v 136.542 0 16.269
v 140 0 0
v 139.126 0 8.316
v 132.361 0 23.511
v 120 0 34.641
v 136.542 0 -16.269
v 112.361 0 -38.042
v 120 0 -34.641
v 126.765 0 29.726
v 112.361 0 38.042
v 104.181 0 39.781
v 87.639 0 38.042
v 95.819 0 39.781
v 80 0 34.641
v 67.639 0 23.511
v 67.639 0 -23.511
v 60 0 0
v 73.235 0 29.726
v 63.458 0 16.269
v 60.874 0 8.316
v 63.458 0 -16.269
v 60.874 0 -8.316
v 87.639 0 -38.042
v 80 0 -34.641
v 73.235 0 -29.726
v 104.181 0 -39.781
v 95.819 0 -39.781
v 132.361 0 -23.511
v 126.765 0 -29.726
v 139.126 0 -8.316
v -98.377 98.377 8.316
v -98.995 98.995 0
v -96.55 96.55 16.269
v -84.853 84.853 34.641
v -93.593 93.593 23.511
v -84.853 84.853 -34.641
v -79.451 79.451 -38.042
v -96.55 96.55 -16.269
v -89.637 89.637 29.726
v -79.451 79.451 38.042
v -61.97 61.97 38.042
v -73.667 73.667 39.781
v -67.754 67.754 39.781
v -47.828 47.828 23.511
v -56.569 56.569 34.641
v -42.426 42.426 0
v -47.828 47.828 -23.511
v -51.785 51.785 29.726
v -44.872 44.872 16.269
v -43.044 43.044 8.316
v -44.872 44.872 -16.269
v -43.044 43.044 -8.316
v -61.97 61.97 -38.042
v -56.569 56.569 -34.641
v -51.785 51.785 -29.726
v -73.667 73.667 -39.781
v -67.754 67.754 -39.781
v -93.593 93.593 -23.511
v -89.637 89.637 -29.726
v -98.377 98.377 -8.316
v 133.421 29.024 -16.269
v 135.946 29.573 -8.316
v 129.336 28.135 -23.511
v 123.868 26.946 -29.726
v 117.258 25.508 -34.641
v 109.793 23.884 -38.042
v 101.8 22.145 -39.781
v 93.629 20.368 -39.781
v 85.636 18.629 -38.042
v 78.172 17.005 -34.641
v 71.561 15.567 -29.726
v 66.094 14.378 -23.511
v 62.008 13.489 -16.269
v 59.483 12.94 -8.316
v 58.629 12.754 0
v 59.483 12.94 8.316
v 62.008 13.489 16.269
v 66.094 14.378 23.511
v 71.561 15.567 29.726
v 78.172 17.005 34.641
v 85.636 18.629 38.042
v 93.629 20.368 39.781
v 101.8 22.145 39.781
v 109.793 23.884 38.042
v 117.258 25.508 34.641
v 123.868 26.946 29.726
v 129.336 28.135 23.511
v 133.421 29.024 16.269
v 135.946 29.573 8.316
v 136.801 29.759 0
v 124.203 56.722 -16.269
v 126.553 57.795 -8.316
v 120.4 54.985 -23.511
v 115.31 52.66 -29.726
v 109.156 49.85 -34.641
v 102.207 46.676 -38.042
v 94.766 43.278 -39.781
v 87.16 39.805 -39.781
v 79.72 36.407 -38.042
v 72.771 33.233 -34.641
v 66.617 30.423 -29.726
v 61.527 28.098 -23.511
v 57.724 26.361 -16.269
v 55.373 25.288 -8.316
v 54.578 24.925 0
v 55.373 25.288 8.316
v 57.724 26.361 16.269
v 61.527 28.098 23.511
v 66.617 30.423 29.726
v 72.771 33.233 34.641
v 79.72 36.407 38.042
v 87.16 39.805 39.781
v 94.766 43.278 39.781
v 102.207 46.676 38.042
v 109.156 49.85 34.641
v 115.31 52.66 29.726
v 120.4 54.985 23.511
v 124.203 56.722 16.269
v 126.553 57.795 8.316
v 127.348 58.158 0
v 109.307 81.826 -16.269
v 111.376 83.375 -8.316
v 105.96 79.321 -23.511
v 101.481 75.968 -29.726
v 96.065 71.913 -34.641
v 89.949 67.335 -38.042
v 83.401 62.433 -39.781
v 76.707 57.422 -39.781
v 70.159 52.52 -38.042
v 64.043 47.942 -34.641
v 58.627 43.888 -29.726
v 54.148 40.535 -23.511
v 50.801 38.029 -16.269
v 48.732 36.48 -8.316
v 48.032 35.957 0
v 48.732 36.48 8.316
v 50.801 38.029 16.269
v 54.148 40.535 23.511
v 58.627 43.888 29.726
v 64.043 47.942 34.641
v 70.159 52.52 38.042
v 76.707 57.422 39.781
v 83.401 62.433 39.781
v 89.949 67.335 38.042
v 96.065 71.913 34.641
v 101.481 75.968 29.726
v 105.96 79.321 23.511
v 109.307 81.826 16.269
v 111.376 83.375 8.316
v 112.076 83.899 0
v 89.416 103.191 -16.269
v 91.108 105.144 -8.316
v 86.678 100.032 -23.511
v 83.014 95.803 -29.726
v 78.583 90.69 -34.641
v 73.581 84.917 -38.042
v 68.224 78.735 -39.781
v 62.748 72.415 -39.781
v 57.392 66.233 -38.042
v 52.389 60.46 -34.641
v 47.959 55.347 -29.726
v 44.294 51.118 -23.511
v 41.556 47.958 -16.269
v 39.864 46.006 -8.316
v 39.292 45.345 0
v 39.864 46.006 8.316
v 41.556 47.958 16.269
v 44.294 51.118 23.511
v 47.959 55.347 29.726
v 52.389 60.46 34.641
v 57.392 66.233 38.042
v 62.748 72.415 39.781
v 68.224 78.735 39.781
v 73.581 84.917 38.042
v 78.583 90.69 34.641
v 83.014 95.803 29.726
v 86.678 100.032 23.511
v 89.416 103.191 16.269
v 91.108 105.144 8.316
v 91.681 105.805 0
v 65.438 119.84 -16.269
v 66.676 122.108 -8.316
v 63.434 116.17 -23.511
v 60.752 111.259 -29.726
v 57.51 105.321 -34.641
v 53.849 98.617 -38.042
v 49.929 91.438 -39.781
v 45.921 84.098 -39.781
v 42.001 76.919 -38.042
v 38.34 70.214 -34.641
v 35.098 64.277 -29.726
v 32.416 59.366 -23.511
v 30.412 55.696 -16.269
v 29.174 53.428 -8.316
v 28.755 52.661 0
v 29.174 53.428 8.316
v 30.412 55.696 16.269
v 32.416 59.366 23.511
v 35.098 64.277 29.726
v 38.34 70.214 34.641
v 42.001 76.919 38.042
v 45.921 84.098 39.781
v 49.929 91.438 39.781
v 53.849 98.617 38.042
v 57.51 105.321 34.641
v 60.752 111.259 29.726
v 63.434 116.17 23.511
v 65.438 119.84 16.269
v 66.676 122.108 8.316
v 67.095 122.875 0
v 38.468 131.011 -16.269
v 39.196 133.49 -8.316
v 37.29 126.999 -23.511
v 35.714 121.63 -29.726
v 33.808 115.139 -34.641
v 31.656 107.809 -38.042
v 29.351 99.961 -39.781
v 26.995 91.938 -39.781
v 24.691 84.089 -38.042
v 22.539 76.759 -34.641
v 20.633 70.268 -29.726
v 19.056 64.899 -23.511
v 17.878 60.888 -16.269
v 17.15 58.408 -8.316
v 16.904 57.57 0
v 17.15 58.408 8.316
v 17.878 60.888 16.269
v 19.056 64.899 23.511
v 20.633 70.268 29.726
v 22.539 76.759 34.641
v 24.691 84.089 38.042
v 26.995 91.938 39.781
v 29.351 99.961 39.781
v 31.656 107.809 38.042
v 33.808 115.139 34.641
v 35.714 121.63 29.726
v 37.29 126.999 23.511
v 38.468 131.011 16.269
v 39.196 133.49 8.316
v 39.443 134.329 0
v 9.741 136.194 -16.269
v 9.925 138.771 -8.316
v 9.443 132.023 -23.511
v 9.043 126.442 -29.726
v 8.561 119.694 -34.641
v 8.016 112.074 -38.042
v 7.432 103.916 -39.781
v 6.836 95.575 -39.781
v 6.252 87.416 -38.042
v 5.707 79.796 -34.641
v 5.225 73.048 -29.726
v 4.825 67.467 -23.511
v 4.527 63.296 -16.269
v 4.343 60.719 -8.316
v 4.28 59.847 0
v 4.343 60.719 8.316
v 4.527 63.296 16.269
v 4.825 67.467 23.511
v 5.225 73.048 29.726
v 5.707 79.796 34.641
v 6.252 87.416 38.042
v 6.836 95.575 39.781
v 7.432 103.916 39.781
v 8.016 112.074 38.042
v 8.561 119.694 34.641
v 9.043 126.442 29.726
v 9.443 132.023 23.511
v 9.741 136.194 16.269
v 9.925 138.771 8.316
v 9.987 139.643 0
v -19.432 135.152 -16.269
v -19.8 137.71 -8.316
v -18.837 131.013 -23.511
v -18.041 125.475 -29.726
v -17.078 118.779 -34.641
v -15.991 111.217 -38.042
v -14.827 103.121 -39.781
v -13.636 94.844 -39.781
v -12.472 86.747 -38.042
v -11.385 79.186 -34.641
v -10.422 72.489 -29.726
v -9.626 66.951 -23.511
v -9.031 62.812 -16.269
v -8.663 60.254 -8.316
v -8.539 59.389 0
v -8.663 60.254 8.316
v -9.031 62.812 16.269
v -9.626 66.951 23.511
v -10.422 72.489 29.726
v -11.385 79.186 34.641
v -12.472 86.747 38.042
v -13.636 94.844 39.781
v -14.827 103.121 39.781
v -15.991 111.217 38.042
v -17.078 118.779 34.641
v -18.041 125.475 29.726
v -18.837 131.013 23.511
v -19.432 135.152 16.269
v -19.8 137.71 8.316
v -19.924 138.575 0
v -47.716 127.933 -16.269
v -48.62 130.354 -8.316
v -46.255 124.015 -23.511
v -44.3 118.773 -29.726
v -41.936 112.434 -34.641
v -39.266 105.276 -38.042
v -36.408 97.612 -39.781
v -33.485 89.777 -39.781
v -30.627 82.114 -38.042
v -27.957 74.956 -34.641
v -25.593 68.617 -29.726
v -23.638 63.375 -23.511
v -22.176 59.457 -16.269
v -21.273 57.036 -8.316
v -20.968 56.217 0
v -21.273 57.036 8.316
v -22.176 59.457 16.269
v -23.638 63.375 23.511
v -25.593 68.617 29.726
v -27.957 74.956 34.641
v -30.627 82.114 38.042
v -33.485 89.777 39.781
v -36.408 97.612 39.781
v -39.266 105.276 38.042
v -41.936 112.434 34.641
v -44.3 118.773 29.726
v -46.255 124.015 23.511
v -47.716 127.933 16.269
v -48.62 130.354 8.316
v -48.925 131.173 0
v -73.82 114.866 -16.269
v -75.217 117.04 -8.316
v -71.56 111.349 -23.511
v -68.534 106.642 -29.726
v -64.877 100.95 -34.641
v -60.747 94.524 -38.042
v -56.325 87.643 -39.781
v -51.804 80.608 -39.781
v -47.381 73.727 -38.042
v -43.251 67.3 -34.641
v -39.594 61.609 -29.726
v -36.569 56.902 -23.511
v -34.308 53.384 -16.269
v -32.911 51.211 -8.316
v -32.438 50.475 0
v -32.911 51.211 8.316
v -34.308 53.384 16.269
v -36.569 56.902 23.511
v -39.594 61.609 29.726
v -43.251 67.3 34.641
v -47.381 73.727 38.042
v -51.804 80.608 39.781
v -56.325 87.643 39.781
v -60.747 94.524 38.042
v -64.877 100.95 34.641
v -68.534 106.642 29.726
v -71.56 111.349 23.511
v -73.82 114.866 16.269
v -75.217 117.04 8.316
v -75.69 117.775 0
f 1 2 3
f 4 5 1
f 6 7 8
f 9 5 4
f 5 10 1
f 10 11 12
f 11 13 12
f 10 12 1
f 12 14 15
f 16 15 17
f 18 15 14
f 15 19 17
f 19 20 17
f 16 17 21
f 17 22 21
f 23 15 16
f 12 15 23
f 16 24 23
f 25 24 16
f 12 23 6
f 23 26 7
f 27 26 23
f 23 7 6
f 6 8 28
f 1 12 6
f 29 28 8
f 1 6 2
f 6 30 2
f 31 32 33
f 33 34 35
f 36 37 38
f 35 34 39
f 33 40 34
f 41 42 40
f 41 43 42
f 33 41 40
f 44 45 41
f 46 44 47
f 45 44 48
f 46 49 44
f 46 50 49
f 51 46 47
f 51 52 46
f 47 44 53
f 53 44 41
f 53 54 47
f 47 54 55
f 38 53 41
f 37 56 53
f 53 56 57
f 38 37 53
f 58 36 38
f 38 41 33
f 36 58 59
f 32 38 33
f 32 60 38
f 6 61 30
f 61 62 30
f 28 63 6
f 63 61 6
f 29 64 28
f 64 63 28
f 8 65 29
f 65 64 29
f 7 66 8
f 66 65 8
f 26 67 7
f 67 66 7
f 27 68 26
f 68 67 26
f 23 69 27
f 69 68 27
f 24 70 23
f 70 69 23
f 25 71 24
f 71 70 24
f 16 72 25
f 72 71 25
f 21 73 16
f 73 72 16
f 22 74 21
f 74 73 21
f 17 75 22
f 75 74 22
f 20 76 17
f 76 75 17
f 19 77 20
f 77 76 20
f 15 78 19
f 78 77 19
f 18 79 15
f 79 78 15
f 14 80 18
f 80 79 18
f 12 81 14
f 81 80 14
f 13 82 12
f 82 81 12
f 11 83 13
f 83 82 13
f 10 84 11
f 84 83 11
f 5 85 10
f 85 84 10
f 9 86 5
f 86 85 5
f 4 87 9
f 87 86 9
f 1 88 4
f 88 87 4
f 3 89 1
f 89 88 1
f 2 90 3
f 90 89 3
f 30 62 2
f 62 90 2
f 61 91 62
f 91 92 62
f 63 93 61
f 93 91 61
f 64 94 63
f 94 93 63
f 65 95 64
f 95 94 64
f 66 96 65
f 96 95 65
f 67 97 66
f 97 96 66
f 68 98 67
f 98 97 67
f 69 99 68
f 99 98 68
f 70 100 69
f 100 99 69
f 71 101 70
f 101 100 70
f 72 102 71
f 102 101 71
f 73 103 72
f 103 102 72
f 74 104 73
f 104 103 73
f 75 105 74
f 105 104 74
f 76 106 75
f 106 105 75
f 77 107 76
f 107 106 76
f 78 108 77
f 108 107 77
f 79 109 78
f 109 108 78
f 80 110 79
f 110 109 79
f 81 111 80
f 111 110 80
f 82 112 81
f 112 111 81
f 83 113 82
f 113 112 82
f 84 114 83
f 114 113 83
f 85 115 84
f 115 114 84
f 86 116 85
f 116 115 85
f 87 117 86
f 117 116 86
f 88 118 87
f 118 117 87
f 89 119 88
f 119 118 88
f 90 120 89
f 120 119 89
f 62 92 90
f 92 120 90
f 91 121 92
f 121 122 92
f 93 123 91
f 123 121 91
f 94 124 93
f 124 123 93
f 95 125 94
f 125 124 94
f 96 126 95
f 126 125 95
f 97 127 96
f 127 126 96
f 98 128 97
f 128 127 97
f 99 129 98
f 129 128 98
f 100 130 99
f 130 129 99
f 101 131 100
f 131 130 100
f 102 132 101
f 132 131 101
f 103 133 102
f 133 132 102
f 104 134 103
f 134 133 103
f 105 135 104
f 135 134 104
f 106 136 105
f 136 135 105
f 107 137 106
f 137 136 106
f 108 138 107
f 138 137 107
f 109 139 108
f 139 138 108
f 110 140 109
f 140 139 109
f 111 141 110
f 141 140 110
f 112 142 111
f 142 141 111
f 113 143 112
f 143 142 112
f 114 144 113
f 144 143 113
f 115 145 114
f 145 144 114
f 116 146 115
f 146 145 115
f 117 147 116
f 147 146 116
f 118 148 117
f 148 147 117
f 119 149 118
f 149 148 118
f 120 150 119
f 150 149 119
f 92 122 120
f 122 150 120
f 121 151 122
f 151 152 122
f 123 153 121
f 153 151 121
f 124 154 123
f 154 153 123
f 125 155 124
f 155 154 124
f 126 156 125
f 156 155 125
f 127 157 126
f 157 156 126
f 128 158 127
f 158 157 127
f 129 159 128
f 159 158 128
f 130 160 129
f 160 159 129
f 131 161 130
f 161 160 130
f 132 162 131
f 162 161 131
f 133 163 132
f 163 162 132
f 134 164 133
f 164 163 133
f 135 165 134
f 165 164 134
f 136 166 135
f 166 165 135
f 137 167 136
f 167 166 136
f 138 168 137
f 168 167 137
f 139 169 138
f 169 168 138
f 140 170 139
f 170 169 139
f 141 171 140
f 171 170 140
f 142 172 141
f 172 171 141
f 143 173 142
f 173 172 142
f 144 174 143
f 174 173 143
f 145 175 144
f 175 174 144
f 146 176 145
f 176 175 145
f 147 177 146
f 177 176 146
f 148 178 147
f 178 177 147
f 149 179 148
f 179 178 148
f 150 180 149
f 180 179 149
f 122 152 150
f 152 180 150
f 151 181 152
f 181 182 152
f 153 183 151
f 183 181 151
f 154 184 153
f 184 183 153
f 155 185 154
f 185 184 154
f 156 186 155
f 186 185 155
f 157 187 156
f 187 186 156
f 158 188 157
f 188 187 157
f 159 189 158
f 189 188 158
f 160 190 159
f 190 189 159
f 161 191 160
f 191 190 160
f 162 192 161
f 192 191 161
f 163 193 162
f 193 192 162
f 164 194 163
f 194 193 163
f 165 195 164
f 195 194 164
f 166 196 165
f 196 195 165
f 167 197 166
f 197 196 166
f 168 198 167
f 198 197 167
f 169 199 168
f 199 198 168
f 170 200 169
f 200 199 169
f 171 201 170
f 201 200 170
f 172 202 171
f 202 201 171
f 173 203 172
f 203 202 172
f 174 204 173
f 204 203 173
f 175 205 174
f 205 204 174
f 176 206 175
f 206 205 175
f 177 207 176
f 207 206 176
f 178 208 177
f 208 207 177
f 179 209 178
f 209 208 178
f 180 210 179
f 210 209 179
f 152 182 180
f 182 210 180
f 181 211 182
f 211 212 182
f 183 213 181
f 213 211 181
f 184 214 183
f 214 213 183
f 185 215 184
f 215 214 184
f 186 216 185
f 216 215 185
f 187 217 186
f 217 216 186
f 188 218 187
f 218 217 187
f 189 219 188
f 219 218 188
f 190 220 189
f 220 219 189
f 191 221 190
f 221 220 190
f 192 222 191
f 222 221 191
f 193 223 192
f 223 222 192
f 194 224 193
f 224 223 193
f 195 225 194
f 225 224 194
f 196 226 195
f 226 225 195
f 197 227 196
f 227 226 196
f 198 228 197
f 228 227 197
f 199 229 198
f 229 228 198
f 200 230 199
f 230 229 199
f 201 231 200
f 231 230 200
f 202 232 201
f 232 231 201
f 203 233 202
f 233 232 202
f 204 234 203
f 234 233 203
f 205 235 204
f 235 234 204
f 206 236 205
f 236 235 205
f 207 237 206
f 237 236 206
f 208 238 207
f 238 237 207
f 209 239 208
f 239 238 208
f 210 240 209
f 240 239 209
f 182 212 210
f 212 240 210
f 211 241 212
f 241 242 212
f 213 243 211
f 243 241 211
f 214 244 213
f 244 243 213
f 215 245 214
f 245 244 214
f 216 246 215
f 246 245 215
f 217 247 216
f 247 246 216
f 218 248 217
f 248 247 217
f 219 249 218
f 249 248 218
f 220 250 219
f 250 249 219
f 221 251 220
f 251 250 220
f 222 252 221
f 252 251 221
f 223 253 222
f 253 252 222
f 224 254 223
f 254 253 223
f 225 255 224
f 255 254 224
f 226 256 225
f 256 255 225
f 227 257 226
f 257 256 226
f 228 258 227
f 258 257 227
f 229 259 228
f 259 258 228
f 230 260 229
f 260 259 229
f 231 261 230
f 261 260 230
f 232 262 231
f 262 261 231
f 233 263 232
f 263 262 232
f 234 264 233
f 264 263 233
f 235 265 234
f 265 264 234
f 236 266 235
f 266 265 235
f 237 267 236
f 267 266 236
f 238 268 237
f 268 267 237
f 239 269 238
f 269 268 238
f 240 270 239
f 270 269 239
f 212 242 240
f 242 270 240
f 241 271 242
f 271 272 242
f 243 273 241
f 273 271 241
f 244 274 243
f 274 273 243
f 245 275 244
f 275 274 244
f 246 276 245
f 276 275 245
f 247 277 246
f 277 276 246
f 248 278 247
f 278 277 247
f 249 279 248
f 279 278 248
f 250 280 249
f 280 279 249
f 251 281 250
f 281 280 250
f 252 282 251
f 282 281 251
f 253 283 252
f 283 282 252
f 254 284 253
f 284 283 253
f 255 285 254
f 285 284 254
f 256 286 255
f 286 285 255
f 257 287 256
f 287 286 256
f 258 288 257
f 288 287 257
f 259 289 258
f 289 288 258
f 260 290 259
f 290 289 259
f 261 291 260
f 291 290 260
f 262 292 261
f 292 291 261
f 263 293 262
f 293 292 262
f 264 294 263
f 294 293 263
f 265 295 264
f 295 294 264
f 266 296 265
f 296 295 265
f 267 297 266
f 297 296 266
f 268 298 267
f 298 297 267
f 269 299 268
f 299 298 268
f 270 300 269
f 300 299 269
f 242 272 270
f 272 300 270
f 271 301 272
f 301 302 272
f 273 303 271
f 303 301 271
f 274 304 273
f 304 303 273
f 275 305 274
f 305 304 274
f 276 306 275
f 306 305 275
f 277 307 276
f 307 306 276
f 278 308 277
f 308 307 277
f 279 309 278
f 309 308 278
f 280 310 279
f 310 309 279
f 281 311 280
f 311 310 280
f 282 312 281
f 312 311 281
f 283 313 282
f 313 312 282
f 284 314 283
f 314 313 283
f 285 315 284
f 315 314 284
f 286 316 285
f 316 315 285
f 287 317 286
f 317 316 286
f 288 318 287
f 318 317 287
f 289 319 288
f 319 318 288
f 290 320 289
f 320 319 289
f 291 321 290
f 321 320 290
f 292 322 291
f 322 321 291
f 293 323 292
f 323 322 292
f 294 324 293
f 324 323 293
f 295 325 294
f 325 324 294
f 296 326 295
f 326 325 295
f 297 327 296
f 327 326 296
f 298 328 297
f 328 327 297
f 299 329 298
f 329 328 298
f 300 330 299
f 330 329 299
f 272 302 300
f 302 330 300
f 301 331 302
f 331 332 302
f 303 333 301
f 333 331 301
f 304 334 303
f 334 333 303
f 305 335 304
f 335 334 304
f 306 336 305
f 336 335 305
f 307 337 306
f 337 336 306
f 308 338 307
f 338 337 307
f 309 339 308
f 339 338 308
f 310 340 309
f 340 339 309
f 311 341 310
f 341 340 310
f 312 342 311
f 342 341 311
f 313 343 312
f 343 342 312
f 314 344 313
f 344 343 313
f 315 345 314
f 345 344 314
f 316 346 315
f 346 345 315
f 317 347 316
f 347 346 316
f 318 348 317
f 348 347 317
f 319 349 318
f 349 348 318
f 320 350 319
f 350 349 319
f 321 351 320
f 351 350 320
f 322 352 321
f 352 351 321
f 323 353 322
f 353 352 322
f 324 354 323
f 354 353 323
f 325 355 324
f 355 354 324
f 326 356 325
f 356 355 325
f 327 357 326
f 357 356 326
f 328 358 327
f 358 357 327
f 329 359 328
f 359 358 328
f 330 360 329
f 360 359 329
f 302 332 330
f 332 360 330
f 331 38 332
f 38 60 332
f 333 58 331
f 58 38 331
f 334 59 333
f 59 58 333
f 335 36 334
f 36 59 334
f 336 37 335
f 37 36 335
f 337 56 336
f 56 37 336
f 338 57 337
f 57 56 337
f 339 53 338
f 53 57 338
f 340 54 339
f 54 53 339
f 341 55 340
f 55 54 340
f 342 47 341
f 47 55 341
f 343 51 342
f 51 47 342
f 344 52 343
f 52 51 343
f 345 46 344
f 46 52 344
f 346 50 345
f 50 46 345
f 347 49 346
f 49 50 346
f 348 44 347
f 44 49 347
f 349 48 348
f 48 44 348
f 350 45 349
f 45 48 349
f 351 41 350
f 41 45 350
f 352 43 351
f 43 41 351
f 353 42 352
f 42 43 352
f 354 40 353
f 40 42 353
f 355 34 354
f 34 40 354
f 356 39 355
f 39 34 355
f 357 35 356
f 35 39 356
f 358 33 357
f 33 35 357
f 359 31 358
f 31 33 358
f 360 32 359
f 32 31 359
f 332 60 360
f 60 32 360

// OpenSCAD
rotate_extrude(angle=135) {
  translate([100, 0]) circle(40);
}
